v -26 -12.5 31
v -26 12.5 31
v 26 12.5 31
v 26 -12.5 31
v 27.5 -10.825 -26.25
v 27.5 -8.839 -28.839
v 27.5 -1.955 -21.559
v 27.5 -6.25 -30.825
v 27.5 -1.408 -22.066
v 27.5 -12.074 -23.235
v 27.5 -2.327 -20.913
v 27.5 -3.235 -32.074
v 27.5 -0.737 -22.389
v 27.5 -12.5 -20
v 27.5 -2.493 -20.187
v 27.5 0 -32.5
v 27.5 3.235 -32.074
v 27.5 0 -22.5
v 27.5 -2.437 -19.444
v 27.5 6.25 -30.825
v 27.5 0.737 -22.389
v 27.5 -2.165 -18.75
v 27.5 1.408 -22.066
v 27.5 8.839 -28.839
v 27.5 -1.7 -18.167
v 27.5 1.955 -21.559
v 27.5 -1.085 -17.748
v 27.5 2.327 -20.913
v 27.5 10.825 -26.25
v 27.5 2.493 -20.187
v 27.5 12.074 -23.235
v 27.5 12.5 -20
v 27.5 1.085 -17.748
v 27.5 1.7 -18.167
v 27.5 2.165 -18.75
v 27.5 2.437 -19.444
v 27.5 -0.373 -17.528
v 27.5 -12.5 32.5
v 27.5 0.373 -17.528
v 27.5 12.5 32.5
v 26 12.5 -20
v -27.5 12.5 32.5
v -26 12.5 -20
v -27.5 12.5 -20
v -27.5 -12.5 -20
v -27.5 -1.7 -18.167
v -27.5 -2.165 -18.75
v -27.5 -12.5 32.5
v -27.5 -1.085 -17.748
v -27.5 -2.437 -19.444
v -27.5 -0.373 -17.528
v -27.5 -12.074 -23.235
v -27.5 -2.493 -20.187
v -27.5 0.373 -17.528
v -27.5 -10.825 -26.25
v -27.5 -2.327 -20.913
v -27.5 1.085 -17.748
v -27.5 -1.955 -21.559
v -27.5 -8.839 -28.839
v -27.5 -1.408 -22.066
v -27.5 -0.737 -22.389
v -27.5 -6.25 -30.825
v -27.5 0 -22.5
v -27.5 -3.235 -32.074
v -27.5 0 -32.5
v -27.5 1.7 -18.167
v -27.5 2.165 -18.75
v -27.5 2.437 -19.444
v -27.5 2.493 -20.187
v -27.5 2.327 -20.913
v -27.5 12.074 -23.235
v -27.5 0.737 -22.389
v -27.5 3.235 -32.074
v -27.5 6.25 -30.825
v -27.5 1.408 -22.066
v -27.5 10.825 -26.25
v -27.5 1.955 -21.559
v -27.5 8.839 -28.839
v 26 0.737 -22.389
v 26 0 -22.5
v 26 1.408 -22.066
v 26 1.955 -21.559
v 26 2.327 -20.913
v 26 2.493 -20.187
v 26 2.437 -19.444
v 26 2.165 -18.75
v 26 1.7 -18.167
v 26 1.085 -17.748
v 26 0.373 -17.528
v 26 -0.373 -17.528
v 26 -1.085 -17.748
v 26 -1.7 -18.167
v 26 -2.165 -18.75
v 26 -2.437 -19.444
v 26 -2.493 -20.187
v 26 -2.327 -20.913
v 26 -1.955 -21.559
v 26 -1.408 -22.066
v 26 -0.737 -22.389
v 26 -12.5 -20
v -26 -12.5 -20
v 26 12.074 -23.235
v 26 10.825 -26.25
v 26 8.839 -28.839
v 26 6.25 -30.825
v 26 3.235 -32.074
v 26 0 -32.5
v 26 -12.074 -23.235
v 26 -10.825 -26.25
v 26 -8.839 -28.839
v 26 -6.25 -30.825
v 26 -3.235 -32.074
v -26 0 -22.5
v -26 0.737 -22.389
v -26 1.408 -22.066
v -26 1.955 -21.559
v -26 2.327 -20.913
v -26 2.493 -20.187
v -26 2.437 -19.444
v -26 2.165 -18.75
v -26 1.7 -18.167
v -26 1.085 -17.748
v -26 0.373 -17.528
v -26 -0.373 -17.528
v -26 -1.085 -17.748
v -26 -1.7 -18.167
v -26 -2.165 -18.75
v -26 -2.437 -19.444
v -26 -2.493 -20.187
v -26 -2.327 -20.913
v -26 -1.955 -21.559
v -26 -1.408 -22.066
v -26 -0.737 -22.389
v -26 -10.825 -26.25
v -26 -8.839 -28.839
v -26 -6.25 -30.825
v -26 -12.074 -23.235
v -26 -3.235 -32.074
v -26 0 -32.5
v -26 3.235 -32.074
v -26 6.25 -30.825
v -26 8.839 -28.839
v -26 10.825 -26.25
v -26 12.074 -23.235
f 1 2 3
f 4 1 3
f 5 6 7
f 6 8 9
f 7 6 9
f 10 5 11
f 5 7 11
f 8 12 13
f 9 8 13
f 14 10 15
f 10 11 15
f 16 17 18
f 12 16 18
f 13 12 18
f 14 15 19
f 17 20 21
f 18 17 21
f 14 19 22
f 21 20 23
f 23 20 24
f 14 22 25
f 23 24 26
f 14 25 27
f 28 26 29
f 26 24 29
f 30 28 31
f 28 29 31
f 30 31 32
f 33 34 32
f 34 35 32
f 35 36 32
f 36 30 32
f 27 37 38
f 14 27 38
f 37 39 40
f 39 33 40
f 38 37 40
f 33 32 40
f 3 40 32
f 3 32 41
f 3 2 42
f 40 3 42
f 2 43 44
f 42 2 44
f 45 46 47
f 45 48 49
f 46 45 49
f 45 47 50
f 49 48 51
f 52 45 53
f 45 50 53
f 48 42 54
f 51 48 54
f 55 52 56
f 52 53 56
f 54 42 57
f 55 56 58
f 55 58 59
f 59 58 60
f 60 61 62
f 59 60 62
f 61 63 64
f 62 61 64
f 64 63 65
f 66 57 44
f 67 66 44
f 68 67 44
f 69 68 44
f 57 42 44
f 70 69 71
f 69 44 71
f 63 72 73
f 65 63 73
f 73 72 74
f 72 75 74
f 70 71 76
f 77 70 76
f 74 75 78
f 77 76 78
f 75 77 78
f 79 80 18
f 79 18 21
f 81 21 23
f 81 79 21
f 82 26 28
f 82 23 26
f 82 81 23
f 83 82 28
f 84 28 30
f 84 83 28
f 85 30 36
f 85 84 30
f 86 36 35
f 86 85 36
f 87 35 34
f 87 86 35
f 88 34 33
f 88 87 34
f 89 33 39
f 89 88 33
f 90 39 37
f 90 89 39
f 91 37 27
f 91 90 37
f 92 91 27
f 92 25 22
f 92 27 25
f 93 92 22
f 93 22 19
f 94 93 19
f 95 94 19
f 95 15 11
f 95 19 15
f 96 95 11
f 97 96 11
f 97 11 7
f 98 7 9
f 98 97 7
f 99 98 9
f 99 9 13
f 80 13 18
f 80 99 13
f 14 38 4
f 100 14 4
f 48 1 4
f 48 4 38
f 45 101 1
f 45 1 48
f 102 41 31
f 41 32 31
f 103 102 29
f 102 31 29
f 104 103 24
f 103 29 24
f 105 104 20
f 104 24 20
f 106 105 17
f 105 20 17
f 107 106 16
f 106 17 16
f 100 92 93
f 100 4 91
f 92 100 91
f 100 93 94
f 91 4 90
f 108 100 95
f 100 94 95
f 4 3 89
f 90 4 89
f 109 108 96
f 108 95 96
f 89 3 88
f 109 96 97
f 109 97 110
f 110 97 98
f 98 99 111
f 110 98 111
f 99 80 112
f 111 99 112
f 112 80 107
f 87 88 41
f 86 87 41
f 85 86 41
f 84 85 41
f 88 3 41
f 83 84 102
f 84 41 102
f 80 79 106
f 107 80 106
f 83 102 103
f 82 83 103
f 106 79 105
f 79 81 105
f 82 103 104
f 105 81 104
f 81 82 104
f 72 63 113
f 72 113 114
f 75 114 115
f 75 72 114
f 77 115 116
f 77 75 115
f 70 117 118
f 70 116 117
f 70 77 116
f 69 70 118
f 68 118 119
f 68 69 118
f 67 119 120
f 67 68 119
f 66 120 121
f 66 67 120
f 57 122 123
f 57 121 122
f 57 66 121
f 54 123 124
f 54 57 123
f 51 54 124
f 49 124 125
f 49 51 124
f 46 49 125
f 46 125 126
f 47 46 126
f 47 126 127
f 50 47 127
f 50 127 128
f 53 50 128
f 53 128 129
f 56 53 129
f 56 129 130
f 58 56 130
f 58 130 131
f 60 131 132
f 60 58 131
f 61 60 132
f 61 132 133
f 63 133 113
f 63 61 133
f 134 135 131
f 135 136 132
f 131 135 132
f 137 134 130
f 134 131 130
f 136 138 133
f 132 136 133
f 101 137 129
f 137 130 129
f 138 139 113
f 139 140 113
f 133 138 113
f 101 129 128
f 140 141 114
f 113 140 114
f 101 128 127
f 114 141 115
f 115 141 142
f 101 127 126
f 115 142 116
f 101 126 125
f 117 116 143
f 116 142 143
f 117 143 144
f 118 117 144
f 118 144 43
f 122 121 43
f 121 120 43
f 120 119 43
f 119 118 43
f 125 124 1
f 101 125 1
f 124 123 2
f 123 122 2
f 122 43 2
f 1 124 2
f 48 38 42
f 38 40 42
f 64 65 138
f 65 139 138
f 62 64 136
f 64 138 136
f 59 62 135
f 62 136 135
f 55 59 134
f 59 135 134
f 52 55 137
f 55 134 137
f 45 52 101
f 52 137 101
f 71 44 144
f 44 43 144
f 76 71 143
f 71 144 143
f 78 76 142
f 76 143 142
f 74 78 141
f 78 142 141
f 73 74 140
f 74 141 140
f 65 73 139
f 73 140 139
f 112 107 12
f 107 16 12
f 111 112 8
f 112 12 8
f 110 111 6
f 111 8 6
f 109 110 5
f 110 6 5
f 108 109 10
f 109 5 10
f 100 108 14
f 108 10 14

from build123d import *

# Parameters (mm, degrees)
BOSS_EXTRUDE1_DEPTH     = 12.5
FILLET1_R               = 12.5
CUT_EXTRUDE1_DEPTH      = 45.370598373
CUT_EXTRUDE1_DEPTH_BACK = 45.370598373
SKETCH2_R               = 2.5


with BuildPart() as part:
    # Sketch1 → Boss-Extrude1 (new, symmetric)
    with BuildSketch(Plane(origin=(0, 0, 0), x_dir=(1, 0, 0), z_dir=(0, 1, 0))):
        Polygon((26, -31), (26, 32.5), (27.5, 32.5), (27.5, -32.5), (-27.5, -32.5), (-27.5, 32.5), (-26, 32.5), (-26, -31), align=None)
    extrude(amount=BOSS_EXTRUDE1_DEPTH, both=True)

    # Fillet1
    fillet1_edges = [part.edges().sort_by_distance(p)[0] for p in [
        (-26.75, -12.5, -32.5),
        (-26.75, 12.5, -32.5),
        (26.75, -12.5, -32.5),
        (26.75, 12.5, -32.5),
    ]]
    fillet(fillet1_edges, radius=FILLET1_R - 0.0001)  # a hair under: the kernel refuses the full size

    # Sketch2 → Cut-Extrude1 (cut, two sides: drawn at the far end of the back side and taken through both)
    with BuildSketch(Plane(origin=(0, 0, 0), x_dir=(0, 0, -1), z_dir=(1, 0, 0)).offset(-CUT_EXTRUDE1_DEPTH_BACK)):
        with Locations((20, 0)):
            Circle(SKETCH2_R)
    extrude(amount=CUT_EXTRUDE1_DEPTH + CUT_EXTRUDE1_DEPTH_BACK, mode=Mode.SUBTRACT)


solid = part.part
